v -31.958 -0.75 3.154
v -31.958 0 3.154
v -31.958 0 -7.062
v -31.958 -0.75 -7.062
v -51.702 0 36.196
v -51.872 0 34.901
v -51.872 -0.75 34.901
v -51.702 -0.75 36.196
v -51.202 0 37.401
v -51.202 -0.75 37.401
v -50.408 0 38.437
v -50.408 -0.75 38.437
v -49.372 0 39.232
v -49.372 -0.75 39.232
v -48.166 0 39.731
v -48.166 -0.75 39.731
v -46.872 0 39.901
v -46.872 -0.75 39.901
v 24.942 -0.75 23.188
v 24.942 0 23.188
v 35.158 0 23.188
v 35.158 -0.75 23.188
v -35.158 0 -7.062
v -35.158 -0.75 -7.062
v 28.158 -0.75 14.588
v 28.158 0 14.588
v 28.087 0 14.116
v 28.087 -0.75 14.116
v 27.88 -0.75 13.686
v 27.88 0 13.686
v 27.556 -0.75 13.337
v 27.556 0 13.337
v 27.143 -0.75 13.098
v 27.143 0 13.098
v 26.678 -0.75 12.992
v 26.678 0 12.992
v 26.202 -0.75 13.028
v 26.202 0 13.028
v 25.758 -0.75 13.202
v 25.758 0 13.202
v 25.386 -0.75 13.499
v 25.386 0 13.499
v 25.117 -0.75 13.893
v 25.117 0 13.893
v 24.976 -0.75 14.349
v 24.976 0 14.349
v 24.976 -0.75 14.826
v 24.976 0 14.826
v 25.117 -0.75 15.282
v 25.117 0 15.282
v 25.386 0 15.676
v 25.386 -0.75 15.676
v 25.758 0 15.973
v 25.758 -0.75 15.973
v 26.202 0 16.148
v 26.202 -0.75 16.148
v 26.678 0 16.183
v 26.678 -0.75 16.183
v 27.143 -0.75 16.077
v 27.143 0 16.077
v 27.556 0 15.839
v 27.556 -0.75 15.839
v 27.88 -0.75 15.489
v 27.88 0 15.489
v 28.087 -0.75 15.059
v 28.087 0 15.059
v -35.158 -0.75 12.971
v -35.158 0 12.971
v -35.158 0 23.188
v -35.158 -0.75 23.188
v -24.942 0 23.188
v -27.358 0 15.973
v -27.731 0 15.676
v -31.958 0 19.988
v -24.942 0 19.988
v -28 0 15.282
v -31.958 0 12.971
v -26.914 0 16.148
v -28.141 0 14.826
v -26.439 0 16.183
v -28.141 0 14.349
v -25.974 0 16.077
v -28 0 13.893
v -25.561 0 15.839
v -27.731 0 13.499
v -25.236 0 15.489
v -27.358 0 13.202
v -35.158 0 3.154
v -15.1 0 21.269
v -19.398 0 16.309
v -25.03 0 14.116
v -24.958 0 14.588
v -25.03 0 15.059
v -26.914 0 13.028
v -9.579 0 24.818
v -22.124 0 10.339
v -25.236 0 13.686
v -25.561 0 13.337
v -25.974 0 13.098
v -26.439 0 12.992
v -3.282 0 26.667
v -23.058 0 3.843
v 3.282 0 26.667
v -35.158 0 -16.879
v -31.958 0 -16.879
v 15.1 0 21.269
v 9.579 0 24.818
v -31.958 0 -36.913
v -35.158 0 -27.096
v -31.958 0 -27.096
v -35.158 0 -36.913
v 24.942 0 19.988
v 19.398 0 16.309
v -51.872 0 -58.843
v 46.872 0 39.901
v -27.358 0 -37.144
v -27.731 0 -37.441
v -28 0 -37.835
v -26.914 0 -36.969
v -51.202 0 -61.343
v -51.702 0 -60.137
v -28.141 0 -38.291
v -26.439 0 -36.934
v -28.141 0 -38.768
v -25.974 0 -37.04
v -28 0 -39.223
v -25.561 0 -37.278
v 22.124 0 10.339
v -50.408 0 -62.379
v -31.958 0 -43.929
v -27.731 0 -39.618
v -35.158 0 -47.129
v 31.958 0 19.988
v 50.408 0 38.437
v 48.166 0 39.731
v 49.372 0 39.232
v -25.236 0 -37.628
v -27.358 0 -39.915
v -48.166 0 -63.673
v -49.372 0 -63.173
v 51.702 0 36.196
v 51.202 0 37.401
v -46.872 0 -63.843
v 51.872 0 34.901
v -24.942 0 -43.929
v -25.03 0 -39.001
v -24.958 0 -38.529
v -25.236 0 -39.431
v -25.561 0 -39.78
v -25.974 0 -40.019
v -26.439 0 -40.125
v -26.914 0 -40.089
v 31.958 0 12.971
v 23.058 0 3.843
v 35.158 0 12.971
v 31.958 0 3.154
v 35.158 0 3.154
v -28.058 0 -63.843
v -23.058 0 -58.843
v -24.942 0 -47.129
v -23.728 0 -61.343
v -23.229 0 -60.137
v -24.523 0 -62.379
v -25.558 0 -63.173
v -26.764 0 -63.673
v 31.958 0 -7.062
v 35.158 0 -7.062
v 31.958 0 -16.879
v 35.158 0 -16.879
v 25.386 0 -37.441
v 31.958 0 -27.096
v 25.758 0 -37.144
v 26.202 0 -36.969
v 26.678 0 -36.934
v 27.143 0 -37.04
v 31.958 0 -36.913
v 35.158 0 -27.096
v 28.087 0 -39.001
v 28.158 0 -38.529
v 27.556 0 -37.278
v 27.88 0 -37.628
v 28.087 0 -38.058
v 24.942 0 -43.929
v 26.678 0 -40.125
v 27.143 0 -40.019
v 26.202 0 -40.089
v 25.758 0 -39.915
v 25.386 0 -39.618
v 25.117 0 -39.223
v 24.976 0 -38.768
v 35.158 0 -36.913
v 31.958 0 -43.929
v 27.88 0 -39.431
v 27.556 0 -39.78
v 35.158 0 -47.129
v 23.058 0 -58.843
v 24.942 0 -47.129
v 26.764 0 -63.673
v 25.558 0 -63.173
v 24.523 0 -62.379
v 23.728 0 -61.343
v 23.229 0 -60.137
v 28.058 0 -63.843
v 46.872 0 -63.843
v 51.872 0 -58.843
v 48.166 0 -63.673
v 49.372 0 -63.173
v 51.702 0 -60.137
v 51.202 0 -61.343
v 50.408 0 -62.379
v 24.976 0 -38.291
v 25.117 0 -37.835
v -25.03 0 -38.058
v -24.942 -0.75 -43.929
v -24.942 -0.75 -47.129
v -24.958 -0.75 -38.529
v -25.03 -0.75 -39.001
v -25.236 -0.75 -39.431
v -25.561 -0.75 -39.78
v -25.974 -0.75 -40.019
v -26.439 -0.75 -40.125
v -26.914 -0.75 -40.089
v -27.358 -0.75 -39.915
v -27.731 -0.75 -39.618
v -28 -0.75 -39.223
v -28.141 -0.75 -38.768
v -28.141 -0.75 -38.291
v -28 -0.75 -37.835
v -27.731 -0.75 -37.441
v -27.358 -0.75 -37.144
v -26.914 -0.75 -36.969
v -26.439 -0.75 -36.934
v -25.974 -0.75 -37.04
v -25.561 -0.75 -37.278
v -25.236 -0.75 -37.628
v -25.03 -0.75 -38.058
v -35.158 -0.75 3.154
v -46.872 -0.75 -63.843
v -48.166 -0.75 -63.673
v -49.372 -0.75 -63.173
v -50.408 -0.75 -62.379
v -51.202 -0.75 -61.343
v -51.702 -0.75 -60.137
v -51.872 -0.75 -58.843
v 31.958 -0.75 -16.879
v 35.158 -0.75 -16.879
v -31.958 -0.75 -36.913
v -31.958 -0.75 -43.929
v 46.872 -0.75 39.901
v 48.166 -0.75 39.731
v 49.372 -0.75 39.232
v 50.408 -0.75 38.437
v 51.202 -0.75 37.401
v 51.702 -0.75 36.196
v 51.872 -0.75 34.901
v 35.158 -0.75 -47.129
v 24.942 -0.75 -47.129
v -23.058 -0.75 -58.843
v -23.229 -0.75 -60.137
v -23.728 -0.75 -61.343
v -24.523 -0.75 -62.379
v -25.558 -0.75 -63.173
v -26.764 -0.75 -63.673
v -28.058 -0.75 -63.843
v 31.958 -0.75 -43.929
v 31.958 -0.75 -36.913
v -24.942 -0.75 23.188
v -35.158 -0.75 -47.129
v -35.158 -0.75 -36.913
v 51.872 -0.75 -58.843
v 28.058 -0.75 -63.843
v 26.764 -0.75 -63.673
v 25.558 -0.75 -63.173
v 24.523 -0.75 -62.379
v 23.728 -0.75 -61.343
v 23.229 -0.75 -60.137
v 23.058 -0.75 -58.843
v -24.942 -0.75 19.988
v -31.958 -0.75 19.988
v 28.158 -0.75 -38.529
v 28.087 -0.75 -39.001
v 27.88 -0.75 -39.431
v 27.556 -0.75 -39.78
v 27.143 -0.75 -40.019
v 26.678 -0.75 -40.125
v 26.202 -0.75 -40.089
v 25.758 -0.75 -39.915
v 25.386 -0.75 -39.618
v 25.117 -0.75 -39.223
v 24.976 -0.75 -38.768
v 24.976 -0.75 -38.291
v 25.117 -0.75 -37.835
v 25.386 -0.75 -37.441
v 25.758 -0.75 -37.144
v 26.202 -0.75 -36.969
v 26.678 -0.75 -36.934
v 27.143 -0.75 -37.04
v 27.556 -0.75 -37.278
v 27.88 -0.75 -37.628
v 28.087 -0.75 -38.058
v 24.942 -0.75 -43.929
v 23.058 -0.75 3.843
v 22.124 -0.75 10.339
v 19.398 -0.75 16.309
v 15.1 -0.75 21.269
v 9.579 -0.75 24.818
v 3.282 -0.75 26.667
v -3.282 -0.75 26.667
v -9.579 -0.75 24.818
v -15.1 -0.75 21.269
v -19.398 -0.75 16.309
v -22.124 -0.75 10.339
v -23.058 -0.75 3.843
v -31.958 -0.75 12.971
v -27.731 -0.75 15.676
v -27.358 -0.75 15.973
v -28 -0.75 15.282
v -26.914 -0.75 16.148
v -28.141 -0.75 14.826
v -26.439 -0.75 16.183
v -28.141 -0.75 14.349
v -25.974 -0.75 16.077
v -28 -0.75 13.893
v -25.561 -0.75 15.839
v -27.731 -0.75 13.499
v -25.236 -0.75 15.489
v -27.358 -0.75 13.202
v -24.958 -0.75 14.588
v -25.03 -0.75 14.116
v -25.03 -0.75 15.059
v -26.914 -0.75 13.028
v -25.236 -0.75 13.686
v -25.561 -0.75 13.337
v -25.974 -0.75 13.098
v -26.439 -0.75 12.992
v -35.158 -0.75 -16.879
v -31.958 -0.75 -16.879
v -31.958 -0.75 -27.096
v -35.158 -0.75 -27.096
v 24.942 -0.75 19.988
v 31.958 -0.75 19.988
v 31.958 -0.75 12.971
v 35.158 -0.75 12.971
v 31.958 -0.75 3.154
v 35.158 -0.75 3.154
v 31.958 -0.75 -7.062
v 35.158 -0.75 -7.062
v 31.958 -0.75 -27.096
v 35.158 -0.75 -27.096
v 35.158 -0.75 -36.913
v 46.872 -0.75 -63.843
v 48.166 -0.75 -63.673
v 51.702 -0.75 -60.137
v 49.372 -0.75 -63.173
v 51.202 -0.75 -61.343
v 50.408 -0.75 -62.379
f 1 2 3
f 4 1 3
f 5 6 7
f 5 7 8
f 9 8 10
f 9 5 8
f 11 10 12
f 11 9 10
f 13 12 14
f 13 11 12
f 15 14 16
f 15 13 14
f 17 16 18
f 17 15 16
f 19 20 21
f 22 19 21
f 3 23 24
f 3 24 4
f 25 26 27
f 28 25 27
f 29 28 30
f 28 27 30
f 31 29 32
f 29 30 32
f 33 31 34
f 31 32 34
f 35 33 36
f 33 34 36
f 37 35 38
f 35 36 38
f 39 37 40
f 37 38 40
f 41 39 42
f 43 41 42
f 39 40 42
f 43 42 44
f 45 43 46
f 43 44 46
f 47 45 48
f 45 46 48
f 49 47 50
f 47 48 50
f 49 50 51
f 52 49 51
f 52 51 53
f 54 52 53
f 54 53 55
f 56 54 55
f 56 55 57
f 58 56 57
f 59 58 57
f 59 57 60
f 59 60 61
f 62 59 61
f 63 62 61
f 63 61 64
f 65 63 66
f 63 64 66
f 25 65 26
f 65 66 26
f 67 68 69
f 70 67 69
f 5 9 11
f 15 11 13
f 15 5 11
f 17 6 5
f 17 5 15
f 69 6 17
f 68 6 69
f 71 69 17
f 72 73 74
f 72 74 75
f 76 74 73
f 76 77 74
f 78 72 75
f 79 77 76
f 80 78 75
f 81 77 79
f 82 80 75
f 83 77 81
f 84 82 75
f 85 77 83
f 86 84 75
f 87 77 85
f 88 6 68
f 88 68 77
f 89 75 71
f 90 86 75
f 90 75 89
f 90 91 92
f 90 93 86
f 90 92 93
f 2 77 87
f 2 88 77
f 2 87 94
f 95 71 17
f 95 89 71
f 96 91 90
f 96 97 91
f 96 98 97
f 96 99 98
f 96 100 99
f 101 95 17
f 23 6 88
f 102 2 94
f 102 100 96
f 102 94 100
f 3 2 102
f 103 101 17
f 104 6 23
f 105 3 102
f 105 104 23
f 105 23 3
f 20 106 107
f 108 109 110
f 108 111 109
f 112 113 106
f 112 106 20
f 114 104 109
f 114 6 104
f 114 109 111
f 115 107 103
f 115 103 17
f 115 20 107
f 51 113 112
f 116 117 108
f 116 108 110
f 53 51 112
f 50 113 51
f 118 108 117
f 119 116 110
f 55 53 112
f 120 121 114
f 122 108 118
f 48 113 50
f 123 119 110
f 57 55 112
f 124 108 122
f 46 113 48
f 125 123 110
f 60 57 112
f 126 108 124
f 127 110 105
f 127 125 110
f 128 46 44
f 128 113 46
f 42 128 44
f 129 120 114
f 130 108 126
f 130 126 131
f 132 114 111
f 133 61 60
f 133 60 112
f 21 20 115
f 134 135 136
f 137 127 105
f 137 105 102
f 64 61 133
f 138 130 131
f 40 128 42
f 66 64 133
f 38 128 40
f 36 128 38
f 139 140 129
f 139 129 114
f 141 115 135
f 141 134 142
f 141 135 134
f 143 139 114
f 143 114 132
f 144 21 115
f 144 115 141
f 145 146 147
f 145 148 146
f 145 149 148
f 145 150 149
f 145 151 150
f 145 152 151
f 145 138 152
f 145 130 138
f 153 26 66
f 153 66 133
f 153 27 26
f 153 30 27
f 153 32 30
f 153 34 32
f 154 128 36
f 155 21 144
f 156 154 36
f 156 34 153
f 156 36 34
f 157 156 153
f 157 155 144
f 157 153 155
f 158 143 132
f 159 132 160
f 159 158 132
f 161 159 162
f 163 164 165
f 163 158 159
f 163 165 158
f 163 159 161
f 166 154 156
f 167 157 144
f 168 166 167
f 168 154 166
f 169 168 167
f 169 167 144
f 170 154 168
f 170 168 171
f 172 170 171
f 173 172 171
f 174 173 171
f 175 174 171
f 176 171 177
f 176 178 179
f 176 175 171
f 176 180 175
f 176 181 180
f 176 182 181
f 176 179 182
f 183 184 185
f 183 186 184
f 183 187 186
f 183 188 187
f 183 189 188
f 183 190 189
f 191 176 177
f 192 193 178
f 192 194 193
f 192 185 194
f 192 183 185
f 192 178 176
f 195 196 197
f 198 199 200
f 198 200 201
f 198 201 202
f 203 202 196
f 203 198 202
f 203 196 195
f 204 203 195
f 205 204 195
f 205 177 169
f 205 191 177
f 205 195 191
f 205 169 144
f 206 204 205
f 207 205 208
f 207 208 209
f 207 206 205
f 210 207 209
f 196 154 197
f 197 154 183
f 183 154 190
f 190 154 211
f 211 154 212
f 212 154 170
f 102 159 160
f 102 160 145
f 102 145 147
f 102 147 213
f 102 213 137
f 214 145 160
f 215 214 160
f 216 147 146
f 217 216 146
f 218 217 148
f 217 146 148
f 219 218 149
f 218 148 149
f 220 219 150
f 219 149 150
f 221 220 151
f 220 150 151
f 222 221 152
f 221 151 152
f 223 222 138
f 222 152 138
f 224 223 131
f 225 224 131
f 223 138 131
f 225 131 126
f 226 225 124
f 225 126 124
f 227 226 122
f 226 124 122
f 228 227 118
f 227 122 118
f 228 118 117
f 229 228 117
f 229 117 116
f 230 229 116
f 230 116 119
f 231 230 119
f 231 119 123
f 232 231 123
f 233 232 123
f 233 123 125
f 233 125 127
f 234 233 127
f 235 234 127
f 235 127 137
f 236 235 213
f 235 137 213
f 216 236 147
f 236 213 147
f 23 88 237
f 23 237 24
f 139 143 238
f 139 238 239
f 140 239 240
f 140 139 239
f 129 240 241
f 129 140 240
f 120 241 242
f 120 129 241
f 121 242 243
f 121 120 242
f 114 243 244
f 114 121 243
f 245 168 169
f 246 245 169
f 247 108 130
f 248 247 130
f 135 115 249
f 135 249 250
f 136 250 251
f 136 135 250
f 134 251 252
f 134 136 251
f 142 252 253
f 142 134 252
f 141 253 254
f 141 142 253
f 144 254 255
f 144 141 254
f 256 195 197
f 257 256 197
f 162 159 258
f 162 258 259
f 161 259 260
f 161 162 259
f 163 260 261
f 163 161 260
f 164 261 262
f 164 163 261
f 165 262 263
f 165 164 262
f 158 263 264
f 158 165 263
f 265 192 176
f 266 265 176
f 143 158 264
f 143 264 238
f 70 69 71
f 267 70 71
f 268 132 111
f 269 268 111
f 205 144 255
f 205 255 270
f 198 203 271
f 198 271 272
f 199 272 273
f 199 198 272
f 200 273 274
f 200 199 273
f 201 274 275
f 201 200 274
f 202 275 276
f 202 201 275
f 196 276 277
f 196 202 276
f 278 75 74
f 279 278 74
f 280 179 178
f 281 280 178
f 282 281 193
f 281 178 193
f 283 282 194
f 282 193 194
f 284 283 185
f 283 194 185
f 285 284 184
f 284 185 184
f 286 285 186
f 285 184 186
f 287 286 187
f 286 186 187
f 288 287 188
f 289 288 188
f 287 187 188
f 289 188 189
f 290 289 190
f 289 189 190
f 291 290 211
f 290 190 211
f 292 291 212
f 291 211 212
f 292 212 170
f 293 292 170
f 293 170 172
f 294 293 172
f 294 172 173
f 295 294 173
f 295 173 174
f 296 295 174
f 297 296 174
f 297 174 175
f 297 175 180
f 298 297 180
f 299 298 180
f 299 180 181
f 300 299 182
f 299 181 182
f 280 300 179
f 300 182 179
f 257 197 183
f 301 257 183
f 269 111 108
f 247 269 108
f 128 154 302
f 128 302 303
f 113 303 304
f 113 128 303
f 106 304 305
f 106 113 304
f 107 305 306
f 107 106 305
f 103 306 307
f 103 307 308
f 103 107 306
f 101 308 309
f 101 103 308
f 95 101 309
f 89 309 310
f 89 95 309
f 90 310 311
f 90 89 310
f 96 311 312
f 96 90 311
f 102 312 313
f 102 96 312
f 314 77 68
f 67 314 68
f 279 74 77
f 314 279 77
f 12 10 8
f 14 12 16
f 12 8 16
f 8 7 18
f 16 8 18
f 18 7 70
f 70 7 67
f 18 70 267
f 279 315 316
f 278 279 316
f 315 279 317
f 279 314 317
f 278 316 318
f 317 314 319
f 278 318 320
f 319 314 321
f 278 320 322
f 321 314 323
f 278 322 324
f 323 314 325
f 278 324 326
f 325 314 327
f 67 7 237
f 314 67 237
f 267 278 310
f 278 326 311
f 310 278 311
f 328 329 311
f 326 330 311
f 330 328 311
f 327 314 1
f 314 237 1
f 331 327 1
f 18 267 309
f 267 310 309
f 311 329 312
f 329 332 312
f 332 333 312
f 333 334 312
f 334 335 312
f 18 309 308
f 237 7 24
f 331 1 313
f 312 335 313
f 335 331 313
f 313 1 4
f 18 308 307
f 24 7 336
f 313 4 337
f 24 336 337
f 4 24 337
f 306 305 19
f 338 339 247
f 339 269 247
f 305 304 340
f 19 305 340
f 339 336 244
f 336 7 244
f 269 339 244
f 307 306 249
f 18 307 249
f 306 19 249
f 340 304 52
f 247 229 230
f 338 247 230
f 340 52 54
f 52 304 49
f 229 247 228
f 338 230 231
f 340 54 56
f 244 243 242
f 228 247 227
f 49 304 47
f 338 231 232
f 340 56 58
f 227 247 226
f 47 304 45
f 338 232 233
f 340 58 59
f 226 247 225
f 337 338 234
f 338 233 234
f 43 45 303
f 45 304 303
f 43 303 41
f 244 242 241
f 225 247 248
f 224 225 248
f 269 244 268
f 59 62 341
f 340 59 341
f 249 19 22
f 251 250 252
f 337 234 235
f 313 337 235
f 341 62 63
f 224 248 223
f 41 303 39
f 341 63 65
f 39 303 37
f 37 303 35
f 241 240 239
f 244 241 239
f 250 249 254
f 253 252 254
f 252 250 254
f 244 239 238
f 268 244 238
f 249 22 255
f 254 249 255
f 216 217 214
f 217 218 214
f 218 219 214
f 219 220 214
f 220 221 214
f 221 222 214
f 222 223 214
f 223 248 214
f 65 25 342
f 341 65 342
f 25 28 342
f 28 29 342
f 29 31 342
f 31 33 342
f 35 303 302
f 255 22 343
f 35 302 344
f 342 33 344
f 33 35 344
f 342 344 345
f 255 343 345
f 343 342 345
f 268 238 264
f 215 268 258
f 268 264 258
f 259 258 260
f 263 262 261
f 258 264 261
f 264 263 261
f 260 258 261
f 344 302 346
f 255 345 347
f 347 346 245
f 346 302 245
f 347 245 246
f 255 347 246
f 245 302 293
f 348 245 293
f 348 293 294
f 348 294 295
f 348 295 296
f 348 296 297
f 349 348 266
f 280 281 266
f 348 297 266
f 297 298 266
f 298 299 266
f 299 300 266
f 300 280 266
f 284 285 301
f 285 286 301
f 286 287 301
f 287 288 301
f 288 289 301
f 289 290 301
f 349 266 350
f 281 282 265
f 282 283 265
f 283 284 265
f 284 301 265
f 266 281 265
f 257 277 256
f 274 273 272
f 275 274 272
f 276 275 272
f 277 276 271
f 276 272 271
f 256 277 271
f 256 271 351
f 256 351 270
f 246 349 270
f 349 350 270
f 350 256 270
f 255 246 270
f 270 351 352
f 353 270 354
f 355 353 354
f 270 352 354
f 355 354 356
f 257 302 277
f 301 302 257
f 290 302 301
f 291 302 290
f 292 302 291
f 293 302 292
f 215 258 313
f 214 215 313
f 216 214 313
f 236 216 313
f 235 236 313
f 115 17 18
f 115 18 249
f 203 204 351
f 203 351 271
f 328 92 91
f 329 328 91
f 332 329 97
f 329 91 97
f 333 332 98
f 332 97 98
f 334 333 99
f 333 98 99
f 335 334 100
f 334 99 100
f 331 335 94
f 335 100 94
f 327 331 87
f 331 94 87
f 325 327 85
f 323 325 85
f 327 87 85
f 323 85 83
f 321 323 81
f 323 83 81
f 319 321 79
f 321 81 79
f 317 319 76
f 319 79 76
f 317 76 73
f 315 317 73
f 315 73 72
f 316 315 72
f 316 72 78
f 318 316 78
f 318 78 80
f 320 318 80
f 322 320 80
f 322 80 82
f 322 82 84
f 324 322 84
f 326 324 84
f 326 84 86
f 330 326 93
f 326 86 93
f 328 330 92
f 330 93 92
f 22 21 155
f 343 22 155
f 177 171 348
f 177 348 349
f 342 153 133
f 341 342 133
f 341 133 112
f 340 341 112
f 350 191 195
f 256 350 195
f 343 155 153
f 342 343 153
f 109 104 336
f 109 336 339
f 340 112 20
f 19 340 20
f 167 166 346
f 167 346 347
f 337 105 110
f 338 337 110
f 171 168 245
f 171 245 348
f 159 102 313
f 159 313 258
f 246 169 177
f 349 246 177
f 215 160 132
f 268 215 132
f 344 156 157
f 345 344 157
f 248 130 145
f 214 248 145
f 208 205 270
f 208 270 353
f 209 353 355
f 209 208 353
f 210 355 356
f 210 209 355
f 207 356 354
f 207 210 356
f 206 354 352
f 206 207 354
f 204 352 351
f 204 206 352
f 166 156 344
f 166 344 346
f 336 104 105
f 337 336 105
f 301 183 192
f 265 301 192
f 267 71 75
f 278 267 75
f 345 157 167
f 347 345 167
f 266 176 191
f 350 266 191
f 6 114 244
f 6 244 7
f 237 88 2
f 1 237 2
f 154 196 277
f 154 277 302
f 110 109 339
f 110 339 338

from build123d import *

# Parameters (mm, degrees)
SKETCH1_R           = 1.6
BOSS_EXTRUDE1_DEPTH = 0.75
SKETCH3_W           = 3.2
SKETCH3_H           = 10.21670071
SKETCH3_H_2         = 10.216700711
CUT_EXTRUDE1_DEPTH  = 1.75


with BuildPart() as part:
    # Sketch1 → Boss-Extrude1 (new body)
    with BuildSketch(Plane(origin=(0, 0, 0), x_dir=(1, 0, 0), z_dir=(0, 1, 0))):
        with BuildLine():
            Line((51.872217102, -34.901443346), (51.872217102, 58.842990858))
            ThreePointArc((51.872217102, 58.842990858), (50.407751008, 62.378524764), (46.872217102, 63.842990858))
            Line((46.872217102, 63.842990858), (28.058452488, 63.842990858))
            ThreePointArc((28.058452488, 63.842990858), (24.522918582, 62.378524764), (23.058452488, 58.842990858))
            Line((23.058452488, 58.842990858), (23.058452488, -3.842990858))
            ThreePointArc((23.058452488, -3.842990858), (0, -26.901443346), (-23.058452488, -3.842990858))
            Line((-23.058452488, -3.842990858), (-23.058452488, 58.842990858))
            ThreePointArc((-23.058452488, 58.842990858), (-24.522918582, 62.378524764), (-28.058452488, 63.842990858))
            Line((-28.058452488, 63.842990858), (-46.872217102, 63.842990858))
            ThreePointArc((-46.872217102, 63.842990858), (-50.407751008, 62.378524764), (-51.872217102, 58.842990858))
            Line((-51.872217102, 58.842990858), (-51.872217102, -34.901443346))
            ThreePointArc((-51.872217102, -34.901443346), (-50.407751008, -38.436977252), (-46.872217102, -39.901443346))
            Line((-46.872217102, -39.901443346), (46.872217102, -39.901443346))
            ThreePointArc((46.872217102, -39.901443346), (50.407751008, -38.436977252), (51.872217102, -34.901443346))
        make_face()
        with Locations((26.558452488, -14.587678732)):
            Circle(SKETCH1_R, mode=Mode.SUBTRACT)
        with Locations((-26.558452488, -14.587678732)):
            Circle(SKETCH1_R, mode=Mode.SUBTRACT)
        with Locations((26.558452488, 38.529226244)):
            Circle(SKETCH1_R, mode=Mode.SUBTRACT)
        with Locations((-26.558452488, 38.529226244)):
            Circle(SKETCH1_R, mode=Mode.SUBTRACT)
    extrude(amount=-BOSS_EXTRUDE1_DEPTH)

    # Sketch3 → Cut-Extrude1 (cut, through all)
    with BuildSketch(Plane(origin=(0, 0, 0), x_dir=(1, 0, 0), z_dir=(0, 1, 0))):
        with Locations((33.558452488, 1.954073045)):
            Rectangle(SKETCH3_W, SKETCH3_H)
        Polygon((35.158452488, 36.912525533), (35.158452488, 47.129226244), (24.941751777, 47.129226244), (24.941751777, 43.929226244), (31.958452488, 43.929226244), (31.958452488, 36.912525533), align=None)
        with Locations((33.558452488, 21.987474467)):
            Rectangle(SKETCH3_W, SKETCH3_H_2)
        with Locations((-33.558452488, 21.987474467)):
            Rectangle(SKETCH3_W, SKETCH3_H_2)
        Polygon((-31.958452488, 36.912525533), (-31.958452488, 43.929226244), (-24.941751777, 43.929226244), (-24.941751777, 47.129226244), (-35.158452488, 47.129226244), (-35.158452488, 36.912525533), align=None)
        Polygon((31.958452488, -12.970978021), (31.958452488, -19.987678732), (24.941751777, -19.987678732), (24.941751777, -23.187678732), (35.158452488, -23.187678732), (35.158452488, -12.970978021), align=None)
        Polygon((-35.158452488, -12.970978021), (-35.158452488, -23.187678732), (-24.941751777, -23.187678732), (-24.941751777, -19.987678732), (-31.958452488, -19.987678732), (-31.958452488, -12.970978021), align=None)
        with Locations((-33.558452488, 1.954073045)):
            Rectangle(SKETCH3_W, SKETCH3_H)
    extrude(amount=-CUT_EXTRUDE1_DEPTH, mode=Mode.SUBTRACT)


solid = part.part
